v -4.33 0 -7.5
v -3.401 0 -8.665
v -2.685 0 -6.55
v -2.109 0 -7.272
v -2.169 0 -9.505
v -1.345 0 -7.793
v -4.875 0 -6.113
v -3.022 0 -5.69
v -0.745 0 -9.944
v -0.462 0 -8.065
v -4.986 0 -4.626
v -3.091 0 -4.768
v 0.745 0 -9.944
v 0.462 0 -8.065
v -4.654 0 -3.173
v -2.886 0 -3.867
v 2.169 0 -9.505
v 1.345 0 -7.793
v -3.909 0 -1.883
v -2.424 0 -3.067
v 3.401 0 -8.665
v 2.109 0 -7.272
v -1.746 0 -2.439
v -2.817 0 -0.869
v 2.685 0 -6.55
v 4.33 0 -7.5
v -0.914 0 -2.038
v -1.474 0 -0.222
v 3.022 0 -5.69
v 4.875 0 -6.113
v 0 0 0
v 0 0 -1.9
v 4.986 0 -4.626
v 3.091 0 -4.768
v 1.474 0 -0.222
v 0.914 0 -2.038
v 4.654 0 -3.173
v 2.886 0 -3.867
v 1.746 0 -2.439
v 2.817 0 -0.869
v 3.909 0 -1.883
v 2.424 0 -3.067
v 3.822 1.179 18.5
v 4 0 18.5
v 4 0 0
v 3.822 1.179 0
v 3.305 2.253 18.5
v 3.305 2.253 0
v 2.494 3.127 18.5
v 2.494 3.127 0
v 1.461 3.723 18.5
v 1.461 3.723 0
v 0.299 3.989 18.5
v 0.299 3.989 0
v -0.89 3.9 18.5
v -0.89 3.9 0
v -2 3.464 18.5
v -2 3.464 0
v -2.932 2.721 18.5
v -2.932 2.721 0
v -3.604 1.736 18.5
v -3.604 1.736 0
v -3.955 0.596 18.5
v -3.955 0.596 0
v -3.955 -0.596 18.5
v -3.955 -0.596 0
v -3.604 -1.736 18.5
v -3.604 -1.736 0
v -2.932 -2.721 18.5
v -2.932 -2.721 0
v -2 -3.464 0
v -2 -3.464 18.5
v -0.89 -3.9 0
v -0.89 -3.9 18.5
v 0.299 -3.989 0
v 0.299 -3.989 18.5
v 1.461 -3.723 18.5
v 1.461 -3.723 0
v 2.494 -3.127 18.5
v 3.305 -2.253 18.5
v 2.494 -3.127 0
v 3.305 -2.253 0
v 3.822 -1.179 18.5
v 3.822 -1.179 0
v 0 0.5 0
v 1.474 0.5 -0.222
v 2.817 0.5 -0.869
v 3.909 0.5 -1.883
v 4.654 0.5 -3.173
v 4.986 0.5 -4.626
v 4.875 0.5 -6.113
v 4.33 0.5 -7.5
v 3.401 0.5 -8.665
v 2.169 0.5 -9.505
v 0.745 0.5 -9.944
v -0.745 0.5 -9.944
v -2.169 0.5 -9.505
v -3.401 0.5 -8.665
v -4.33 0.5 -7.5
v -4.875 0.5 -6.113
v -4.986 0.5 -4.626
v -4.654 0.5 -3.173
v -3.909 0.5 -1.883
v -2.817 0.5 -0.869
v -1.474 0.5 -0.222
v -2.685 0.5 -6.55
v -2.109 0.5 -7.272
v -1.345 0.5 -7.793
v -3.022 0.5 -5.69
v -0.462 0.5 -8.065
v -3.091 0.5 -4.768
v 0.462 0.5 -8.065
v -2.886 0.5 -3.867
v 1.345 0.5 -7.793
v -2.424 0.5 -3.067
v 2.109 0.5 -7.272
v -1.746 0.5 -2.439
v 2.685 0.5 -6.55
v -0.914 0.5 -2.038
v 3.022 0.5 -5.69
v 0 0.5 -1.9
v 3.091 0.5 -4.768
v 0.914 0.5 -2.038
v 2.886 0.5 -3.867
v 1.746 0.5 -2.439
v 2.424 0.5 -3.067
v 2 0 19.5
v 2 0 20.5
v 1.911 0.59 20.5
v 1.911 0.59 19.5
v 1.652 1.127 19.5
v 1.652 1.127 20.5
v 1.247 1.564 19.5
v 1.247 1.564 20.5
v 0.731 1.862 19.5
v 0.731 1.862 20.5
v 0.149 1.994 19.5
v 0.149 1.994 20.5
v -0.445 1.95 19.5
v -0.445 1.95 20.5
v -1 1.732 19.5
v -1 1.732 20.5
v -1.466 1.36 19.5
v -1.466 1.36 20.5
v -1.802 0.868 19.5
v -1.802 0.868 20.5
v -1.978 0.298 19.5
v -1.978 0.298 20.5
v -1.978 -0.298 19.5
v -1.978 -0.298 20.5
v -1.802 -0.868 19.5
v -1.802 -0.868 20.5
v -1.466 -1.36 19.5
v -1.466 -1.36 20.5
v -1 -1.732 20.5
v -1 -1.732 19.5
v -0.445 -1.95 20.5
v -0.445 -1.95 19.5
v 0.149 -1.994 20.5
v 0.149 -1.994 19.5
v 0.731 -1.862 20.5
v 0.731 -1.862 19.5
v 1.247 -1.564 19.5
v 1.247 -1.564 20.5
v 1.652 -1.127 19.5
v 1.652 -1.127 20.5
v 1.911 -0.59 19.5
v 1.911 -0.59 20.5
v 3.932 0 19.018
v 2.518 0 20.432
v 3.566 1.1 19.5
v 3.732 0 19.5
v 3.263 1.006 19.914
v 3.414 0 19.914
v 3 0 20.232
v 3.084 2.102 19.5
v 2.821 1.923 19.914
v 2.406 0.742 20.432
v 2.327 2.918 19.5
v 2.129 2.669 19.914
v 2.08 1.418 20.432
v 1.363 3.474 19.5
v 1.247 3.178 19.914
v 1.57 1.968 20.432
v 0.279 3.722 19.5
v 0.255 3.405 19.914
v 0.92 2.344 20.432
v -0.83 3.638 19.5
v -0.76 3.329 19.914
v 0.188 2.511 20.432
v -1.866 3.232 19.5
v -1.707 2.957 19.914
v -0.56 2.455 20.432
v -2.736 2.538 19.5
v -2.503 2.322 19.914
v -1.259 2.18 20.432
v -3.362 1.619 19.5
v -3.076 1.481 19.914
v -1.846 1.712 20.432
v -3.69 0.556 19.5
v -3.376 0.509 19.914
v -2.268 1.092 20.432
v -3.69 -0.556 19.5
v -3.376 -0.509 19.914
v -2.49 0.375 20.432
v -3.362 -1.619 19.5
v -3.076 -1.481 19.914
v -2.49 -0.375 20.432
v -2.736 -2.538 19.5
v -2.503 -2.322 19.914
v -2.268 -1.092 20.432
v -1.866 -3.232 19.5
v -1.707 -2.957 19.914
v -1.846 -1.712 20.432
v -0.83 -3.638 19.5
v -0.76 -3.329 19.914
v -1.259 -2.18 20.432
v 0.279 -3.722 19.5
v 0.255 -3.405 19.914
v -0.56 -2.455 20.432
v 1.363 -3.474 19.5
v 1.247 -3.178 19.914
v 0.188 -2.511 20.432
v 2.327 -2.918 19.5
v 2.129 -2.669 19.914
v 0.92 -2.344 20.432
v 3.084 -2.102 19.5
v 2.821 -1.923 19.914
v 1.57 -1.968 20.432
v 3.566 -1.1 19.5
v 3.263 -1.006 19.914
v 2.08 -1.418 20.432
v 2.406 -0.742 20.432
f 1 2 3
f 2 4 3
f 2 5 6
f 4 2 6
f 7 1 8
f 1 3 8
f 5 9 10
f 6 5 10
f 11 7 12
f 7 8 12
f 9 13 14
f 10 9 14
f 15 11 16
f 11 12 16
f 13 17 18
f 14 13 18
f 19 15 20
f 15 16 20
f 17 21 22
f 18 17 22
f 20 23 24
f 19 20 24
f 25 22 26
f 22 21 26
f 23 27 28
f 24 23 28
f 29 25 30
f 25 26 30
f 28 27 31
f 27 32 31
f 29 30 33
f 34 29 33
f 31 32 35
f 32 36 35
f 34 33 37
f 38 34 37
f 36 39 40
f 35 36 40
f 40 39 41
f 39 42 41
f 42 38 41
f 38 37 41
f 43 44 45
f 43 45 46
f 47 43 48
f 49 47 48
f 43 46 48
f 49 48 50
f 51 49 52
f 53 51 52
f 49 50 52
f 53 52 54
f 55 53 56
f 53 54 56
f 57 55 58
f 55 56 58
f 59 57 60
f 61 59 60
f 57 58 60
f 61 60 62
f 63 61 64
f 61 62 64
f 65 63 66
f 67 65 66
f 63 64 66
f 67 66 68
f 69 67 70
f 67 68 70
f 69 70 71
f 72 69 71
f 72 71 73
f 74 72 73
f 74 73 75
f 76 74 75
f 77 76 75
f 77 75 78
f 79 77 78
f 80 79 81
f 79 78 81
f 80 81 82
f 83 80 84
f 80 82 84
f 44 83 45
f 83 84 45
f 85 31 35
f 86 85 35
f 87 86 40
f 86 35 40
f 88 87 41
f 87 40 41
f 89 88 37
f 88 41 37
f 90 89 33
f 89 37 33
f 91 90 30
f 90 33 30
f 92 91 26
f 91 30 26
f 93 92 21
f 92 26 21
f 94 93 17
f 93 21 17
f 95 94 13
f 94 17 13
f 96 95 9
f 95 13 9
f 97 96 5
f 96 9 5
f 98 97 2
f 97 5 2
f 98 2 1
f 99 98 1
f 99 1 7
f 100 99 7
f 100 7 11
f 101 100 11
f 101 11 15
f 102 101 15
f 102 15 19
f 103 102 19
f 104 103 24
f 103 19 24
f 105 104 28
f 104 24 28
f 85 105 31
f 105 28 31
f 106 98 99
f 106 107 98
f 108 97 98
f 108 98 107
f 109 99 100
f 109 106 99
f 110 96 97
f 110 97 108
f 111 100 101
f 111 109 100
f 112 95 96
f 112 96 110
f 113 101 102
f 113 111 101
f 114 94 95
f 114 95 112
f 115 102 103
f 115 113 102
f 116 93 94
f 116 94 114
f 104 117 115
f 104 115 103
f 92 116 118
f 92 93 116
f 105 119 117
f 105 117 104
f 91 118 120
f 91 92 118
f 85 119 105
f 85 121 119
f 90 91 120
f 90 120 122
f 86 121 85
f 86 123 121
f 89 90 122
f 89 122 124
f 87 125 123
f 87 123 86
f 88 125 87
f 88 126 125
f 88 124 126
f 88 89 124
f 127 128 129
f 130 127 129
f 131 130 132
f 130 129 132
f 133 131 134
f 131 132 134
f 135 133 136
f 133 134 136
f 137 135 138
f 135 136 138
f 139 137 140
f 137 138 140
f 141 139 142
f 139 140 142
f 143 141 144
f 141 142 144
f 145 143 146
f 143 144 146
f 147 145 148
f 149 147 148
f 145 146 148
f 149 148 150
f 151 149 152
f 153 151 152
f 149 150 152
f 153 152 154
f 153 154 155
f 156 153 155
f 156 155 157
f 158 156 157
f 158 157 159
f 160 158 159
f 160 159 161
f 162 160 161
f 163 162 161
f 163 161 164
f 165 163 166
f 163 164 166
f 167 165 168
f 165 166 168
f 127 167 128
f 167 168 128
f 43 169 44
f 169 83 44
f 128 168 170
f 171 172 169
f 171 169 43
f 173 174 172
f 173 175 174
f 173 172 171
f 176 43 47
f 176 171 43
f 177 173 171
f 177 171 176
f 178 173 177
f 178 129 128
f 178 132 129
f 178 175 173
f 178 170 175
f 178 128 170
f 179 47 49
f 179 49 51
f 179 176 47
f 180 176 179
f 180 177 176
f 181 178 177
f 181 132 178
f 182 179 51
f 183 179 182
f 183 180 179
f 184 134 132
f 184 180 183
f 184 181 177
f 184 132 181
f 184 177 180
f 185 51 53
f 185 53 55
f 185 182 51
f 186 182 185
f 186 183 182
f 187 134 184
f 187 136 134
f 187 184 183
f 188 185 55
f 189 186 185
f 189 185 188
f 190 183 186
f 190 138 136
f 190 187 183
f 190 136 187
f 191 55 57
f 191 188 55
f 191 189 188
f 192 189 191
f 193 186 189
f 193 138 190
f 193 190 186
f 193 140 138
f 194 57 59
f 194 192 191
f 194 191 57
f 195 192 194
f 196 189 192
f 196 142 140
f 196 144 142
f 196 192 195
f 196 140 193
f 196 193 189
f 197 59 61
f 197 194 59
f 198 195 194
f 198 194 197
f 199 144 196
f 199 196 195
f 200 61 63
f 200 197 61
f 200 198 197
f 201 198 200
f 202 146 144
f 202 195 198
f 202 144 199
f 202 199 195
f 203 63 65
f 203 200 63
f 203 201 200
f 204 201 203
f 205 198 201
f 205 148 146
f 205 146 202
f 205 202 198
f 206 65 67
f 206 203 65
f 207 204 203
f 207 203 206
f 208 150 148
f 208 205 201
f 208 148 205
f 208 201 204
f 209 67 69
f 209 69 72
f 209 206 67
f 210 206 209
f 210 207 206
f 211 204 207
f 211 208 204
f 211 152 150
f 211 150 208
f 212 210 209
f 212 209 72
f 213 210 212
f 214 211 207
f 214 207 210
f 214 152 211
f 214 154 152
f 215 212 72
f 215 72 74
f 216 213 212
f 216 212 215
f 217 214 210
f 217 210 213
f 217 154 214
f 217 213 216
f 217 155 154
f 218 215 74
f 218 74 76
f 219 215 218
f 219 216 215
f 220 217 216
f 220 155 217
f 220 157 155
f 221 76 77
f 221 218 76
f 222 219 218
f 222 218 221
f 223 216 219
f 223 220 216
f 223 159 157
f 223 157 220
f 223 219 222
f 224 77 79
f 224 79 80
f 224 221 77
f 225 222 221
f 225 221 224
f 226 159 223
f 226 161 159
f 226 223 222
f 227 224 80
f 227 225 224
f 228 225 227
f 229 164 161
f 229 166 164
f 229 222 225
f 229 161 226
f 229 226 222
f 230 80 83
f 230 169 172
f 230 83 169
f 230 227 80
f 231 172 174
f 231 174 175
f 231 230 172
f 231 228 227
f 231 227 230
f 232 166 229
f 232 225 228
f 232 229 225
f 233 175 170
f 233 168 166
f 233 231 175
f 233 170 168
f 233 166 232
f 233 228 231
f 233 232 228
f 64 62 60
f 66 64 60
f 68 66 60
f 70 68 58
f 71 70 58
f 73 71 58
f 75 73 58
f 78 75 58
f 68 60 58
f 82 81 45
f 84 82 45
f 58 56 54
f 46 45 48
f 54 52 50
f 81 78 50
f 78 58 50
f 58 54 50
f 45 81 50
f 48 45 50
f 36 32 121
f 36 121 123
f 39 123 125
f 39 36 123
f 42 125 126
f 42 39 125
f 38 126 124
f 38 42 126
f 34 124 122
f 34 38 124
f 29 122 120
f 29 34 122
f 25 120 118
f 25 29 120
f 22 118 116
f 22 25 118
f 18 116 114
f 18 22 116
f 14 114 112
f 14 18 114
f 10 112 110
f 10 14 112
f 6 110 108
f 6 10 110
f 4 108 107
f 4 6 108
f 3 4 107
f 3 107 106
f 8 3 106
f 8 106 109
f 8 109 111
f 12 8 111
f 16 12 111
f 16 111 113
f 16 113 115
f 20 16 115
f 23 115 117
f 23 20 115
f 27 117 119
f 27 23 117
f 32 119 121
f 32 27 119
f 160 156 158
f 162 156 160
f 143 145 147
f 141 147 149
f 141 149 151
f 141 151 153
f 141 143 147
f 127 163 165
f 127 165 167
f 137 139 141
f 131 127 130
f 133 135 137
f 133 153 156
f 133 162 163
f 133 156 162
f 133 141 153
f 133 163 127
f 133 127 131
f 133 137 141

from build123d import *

# Parameters (mm, degrees)
SKETCH_8_R          = 4
EXTRUDE_4_DEPTH     = 20.5
SKETCH_10_R         = 5
SKETCH_10_R_2       = 3.1
EXTRUDE_5_DEPTH     = 0.5
FILLET_1_R          = 2
SKETCH_11_R         = 2
CUT_EXTRUDE_1_DEPTH = 1


with BuildPart() as part:
    # ｽｹｯﾁ8 → ﾎﾞｽ - 押し出し4 (new body)
    with BuildSketch(Plane.XY):
        Circle(SKETCH_8_R)
    extrude(amount=EXTRUDE_4_DEPTH)

    # ﾌｨﾚｯﾄ1
    fillet_1_edges = [part.edges().sort_by_distance(p)[0] for p in [
        (-4, 0, 20.5),
    ]]
    fillet(fillet_1_edges, radius=FILLET_1_R)

    # ｽｹｯﾁ11 → ｶｯﾄ - 押し出し1 (cut)
    with BuildSketch(Plane.XY.offset(20.5)):
        Circle(SKETCH_11_R)
    extrude(amount=-CUT_EXTRUDE_1_DEPTH, mode=Mode.SUBTRACT)


with BuildPart() as body_2:
    # ｽｹｯﾁ10 → ﾎﾞｽ - 押し出し5 (new body)
    with BuildSketch(Plane(origin=(0, 0, 0), x_dir=(1, 0, 0), z_dir=(0, 1, 0))):
        with Locations(Location((0, 5, 0), (0, 0, 270))):
            Circle(SKETCH_10_R)
        with Locations(Location((0, 5, 0), (0, 0, 270))):
            Circle(SKETCH_10_R_2, mode=Mode.SUBTRACT)
    extrude(amount=EXTRUDE_5_DEPTH)


solid = Compound([part.part, body_2.part])
